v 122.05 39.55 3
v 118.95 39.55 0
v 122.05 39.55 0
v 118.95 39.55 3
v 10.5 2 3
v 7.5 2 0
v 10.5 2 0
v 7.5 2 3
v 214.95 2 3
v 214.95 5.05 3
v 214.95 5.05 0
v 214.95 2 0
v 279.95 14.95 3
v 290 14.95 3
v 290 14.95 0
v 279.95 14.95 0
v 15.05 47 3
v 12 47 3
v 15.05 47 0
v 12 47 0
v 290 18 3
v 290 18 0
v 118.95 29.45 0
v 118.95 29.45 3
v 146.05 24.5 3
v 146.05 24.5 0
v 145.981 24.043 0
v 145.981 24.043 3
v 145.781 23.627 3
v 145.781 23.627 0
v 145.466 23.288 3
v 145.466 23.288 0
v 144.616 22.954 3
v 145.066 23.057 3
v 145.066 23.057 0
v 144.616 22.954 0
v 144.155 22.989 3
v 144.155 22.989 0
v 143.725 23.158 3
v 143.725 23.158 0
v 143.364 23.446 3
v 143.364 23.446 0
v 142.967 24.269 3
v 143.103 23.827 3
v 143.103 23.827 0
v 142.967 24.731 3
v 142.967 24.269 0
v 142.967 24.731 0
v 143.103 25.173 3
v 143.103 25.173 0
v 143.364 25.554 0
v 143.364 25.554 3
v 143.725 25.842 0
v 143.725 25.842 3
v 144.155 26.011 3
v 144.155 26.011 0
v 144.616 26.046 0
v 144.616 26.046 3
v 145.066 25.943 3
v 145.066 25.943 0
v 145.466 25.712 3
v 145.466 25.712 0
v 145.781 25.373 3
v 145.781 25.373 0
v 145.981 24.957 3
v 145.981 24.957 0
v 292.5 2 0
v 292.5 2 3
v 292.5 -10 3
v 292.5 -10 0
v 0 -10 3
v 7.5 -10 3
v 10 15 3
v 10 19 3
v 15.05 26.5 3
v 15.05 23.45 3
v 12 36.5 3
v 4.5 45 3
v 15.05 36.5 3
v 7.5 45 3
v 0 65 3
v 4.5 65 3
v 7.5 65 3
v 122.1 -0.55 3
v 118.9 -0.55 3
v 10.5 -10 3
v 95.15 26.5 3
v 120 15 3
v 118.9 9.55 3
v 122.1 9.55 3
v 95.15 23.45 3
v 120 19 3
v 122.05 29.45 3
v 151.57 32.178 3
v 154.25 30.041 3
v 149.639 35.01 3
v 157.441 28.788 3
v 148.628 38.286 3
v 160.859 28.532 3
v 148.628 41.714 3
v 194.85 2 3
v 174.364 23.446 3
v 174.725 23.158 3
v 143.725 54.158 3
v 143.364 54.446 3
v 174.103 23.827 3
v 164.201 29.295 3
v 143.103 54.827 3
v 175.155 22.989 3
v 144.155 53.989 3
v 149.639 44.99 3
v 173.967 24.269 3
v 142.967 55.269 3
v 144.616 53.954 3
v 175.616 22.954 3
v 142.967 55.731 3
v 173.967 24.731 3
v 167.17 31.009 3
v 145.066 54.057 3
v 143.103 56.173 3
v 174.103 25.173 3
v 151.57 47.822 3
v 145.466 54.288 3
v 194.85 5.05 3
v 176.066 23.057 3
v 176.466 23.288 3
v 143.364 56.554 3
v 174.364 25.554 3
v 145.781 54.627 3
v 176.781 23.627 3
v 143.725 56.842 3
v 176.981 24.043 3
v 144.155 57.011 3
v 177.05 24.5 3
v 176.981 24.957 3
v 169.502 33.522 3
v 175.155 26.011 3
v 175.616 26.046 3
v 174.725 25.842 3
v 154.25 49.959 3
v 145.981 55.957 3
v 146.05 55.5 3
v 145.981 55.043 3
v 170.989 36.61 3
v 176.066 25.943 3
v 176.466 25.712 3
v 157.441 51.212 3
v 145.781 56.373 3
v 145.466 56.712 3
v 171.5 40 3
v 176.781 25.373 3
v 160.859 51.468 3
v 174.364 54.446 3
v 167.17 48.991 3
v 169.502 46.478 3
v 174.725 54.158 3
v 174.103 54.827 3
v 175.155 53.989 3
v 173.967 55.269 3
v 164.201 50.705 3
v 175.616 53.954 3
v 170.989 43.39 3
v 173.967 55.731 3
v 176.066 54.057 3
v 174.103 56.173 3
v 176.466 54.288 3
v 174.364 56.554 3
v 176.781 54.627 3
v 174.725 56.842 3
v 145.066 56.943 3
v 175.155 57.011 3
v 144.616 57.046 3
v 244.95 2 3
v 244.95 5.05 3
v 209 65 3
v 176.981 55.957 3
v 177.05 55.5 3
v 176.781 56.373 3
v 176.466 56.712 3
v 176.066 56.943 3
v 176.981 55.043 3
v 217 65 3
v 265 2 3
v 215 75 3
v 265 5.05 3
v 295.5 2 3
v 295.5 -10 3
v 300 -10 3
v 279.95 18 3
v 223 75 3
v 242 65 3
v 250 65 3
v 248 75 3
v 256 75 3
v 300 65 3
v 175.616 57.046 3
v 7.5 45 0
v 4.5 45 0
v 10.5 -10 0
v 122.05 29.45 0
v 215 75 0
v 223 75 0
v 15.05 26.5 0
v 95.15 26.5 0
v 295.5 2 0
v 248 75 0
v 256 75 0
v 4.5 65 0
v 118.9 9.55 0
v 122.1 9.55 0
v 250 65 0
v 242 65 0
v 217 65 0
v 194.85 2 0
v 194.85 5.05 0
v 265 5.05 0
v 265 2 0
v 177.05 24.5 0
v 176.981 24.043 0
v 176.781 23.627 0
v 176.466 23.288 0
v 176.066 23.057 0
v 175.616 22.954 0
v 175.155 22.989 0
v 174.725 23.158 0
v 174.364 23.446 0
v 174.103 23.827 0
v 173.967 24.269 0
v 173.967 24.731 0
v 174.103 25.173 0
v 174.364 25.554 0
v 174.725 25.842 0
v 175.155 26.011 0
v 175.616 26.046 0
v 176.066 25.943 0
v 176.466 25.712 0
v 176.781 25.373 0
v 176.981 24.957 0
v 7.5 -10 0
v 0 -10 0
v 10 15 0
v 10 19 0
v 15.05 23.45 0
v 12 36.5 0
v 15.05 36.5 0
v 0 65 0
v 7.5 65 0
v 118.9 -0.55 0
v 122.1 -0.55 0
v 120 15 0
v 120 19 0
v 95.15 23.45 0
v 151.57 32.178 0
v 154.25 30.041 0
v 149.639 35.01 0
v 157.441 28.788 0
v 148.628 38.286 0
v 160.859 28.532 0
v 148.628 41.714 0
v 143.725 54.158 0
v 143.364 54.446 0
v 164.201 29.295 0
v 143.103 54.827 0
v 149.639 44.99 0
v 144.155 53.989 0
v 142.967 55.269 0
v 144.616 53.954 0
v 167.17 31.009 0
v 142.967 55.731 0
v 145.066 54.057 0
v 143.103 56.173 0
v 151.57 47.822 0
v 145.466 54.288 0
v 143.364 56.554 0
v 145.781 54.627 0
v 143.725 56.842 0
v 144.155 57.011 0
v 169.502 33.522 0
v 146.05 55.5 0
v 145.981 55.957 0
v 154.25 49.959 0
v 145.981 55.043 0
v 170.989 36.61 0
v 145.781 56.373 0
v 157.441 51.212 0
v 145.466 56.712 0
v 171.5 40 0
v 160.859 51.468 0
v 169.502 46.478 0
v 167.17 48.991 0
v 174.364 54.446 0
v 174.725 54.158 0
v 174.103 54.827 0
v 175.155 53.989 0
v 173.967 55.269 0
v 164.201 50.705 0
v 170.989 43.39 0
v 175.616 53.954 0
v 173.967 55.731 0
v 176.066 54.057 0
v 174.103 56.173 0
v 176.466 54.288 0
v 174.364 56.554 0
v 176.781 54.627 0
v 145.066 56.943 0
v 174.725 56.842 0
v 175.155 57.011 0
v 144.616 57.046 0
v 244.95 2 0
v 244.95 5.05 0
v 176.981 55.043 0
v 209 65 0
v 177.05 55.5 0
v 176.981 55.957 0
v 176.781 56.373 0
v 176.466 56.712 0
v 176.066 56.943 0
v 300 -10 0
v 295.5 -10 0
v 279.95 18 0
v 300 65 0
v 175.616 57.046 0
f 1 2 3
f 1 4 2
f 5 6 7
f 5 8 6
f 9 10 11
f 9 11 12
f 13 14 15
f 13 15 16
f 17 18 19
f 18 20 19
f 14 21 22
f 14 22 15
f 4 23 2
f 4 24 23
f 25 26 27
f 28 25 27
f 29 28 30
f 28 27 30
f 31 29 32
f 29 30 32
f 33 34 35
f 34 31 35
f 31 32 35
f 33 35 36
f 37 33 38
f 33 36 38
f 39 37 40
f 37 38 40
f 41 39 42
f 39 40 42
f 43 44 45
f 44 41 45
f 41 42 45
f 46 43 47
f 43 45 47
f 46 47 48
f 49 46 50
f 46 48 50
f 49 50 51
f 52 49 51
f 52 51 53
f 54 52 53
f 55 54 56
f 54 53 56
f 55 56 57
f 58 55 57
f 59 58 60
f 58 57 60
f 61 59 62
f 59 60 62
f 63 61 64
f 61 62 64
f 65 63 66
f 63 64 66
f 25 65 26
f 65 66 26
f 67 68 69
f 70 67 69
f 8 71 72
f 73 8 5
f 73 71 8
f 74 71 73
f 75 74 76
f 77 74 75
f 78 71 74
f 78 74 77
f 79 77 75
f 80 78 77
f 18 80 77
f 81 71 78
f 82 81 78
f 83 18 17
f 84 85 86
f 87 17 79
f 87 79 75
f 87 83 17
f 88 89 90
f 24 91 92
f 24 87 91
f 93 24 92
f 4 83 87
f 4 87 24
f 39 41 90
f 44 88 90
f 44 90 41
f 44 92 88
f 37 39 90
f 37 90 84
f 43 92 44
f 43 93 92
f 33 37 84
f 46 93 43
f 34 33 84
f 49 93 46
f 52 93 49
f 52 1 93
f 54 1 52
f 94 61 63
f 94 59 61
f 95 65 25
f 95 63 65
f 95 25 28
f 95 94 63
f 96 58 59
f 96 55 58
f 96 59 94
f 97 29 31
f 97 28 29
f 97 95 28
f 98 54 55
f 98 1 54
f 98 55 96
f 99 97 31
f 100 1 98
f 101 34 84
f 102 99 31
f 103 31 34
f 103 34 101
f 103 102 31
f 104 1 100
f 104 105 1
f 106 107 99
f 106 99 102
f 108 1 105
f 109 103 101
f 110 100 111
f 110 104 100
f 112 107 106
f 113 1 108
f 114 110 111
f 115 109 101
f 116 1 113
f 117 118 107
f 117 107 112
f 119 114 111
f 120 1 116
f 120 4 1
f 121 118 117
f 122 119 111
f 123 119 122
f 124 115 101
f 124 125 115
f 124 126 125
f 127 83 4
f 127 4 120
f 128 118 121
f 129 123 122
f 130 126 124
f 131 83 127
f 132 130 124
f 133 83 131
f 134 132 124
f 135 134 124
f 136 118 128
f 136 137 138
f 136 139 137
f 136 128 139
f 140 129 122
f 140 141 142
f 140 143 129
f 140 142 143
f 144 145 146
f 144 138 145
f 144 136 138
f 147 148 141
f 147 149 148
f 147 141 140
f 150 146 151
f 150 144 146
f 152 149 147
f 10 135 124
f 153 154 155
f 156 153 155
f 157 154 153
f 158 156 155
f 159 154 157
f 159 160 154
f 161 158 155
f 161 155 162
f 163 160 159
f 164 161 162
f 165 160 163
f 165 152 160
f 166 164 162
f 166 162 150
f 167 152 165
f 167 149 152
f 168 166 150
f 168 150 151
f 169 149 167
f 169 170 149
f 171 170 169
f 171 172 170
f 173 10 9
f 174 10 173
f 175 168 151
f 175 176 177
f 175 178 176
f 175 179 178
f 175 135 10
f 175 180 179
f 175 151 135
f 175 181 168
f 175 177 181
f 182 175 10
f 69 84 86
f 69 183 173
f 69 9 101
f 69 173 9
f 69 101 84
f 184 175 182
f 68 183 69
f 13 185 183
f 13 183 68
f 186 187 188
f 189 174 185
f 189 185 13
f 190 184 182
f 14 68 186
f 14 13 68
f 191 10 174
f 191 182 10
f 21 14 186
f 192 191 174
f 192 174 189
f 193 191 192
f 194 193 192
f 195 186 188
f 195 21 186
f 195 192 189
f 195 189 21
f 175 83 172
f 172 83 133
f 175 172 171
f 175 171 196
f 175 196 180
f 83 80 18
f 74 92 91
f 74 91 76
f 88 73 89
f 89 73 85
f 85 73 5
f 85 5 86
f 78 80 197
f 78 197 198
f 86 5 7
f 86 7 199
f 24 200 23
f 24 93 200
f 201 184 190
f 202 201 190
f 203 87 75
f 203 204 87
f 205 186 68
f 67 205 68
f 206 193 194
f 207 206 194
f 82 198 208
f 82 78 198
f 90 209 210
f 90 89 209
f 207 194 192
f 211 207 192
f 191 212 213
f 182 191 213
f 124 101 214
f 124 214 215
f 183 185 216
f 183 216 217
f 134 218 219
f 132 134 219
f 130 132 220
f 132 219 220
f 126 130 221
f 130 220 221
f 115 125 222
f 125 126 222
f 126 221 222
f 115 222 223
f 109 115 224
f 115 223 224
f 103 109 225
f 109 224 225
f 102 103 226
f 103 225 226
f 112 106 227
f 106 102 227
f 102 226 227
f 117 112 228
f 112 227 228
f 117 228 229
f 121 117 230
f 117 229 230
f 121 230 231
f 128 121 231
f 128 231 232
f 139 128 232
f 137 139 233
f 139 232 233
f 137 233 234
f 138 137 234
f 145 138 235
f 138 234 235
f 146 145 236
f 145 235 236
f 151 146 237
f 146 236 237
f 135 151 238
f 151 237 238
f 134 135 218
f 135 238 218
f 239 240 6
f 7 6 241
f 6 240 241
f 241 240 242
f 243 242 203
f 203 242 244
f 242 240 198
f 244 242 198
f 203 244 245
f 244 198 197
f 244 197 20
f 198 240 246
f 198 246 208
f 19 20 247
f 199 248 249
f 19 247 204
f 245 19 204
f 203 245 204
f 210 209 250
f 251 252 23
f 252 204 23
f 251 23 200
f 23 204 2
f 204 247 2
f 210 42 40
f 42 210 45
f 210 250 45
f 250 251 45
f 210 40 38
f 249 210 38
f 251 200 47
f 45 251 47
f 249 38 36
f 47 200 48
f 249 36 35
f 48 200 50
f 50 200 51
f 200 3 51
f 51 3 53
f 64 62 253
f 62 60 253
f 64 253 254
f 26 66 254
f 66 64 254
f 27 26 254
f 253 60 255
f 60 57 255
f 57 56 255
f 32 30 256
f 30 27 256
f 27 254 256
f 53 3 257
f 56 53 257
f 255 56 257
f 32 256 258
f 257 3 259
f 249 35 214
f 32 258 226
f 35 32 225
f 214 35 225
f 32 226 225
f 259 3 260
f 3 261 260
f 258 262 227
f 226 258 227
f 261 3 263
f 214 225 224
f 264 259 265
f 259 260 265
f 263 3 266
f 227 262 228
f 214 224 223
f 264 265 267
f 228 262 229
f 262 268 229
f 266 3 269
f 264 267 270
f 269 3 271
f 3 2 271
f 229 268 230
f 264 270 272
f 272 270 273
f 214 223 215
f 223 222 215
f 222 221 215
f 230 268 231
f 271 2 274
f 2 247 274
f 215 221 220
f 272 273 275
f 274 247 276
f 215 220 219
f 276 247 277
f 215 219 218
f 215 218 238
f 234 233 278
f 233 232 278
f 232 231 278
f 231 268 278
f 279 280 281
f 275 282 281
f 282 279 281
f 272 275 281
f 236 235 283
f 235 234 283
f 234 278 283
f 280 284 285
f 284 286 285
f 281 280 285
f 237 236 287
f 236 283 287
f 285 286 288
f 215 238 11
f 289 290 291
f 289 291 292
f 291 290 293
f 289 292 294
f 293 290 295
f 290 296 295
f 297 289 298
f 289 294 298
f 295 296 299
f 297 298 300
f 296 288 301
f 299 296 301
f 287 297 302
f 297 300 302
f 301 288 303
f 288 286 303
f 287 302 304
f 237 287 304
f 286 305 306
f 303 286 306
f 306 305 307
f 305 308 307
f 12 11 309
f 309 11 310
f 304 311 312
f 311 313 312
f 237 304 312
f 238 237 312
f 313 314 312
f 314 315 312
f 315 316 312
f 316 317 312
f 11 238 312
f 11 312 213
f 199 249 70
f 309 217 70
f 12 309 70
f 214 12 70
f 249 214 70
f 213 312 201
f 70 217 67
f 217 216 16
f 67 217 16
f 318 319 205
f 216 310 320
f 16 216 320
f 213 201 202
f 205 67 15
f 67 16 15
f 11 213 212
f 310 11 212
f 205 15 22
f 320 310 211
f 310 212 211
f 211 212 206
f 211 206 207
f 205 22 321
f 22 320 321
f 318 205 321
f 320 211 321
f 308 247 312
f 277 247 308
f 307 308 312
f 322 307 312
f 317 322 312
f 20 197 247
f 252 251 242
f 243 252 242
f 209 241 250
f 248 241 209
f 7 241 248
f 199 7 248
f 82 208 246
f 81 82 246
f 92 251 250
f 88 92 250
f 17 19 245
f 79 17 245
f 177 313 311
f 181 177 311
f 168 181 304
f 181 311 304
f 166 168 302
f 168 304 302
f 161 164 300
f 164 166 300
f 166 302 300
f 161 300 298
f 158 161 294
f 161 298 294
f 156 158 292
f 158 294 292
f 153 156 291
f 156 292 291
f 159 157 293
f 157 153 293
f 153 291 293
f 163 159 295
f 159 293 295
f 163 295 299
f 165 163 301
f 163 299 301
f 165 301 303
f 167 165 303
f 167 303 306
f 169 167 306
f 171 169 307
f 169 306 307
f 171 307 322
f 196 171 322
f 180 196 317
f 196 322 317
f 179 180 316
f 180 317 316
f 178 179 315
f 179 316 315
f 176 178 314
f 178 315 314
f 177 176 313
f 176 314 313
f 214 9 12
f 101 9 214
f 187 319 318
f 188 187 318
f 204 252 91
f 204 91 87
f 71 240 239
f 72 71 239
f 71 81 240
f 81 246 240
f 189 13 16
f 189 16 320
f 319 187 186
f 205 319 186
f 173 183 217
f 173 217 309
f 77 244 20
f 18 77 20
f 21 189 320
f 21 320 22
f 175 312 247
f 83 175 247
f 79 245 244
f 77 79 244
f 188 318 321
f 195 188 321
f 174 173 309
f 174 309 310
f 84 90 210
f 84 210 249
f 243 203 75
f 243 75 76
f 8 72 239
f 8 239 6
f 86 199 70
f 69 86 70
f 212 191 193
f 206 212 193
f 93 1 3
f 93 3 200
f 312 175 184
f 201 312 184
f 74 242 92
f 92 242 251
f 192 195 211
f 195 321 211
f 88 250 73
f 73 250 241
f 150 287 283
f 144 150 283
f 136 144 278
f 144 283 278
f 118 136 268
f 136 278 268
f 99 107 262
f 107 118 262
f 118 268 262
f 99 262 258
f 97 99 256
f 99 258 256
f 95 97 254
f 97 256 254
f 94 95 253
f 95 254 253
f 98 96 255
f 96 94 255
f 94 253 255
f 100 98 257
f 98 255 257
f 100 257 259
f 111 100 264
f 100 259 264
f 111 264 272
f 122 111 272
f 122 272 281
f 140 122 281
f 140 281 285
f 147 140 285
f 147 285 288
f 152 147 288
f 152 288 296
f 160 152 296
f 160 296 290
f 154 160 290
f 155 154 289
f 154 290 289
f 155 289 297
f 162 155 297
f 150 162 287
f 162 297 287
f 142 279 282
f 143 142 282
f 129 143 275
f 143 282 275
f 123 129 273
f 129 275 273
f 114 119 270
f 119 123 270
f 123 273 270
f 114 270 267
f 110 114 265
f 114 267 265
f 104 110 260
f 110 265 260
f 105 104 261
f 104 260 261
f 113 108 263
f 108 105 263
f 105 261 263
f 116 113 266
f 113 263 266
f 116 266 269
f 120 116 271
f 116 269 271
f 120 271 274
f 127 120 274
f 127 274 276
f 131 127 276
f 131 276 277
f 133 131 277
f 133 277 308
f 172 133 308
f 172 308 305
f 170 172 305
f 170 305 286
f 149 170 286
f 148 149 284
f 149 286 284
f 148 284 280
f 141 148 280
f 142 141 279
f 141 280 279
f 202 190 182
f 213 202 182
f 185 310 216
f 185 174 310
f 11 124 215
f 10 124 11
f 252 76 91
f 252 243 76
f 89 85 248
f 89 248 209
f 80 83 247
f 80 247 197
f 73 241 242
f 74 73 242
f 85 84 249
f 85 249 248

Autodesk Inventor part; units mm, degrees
ref_plane "YZ Plane" through (0, 0, 0) normal (1, 0, 0) x (0, 1, 0)
ref_plane "XZ Plane" through (0, 0, 0) normal (0, 1, 0) x (-1, 0, 0)
ref_plane "XY Plane" through (0, 0, 0) normal (0, 0, 1) x (1, 0, 0)
sketch "Sketch1" plane through (0, 0, 0) normal (0, 0, 1) x (1, 0, 0)
  line L0 (0, 0) -> (300, 0)
  line L1 (300, 0) -> (300, 65)
  line L2 (300, 65) -> (0, 65)
  line L3 (0, 65) -> (0, 0)
  circle A0 centre (144.5, 55.5) radius 1.55
  circle A1 centre (144.5, 24.5) radius 1.55
  circle A2 centre (175.5, 55.5) radius 1.55
  circle A3 centre (175.5, 24.5) radius 1.55
  circle A4 centre (160, 40) radius 11.5
  line L4 (10, 19) -> (120, 19)
  line L5 (120, 19) -> (120, 15)
  line L6 (120, 15) -> (10, 15)
  line L7 (10, 15) -> (10, 19)
  line L8 (0, 65) -> (39.6145, 65)
  line L9 (4.5, 65) -> (7.5, 65)
  line L10 (0, 65) -> (50, 65)
  line L11 (0, 0) -> (0, -10)
  line L12 (0, -10) -> (300, -10)
  line L13 (300, -10) -> (300, 0)
  point P0 (10, 17)
  point P1 (120, 17)
  dimension "d1" = 3.1
  dimension "d2" = 3.1
  dimension "d3" = 3.1
  dimension "d4" = 3.1
  dimension "d5" = 31
  dimension "d7" = 23
  dimension "d8" = 15.5
  dimension "d9" = 15.5
  dimension "d10" = 65
  dimension "d11" = 31
  dimension "d13" = 40
  dimension "d54" = 300
  dimension "d55" = 3
  dimension "d59" = 110
  dimension "d93" = 15
  dimension "d107" = 10
  dimension "d201" = 4
  dimension "d202" = 10
  dimension "d287" = 140
extrude "Extrusion1" add sketch "Sketch1" along normal blind 3
sketch "Sketch7" plane through (0, 0, 3) normal (0, 0, 1) x (1, 0, 0)
  line L0 (300, 65) -> (0, 65) projected
  circle A0 centre (144.5, 55.5) radius 1.55 projected
  line L1 (118.95, 39.55) -> (122.05, 39.55)
  line L2 (122.05, 39.55) -> (122.05, 29.45)
  line L3 (122.05, 29.45) -> (118.95, 29.45)
  line L4 (118.95, 29.45) -> (118.95, 39.55)
  line L5 (118.95, 39.55) -> (122.05, 29.45) construction
  line L6 (122.05, 39.55) -> (118.95, 29.45) construction
  line L7 (122.1, 9.55) -> (122.1, -0.55)
  line L8 (122.1, -0.55) -> (118.9, -0.55)
  line L9 (118.9, 9.55) -> (122.1, 9.55)
  line L10 (118.9, -0.55) -> (118.9, 9.55)
  line L11 (118.9, 9.55) -> (122.1, -0.55) construction
  line L12 (122.1, 9.55) -> (118.9, -0.55) construction
  line L13 (0, -10) -> (300, -10) projected
  line L14 (300, -10) -> (300, 65) projected
  circle A1 centre (144.5, 24.5) radius 1.55 projected
  point P0 (0, 0)
  point P1 (242, 62)
  point P2 (120.5, 34.5)
  point P3 (120.5, 4.5)
  point P4 (118.9, 4.5)
  point P5 (150, -10)
  dimension "d185" = 3.2
  dimension "d271" = 3.1
  dimension "d273" = 30
  dimension "d275" = 24
extrude "Extrusion6" cut sketch "Sketch7" against normal blind 3 contours L1 L2 L3 L4 | L7 L8 L10 L9
sketch "Sketch8" plane through (0, 0, 3) normal (0, 0, 1) x (1, 0, 0)
  line L0 (0, -10) -> (300, -10) projected
  line L1 (279.95, 18) -> (290, 18)
  line L2 (290, 18) -> (290, 14.95)
  line L3 (290, 14.95) -> (279.95, 14.95)
  line L4 (279.95, 14.95) -> (279.95, 18)
  line L5 (300, -10) -> (300, 65) projected
  line L6 (7.5, 2) -> (10.5, 2)
  line L7 (10.5, 2) -> (10.5, -10)
  line L8 (10.5, -10) -> (7.5, -10)
  line L9 (7.5, -10) -> (7.5, 2)
  line L10 (7.5, 2) -> (10.5, -10) construction
  line L11 (10.5, 2) -> (7.5, -10) construction
  line L12 (295.5, 2) -> (292.5, 2)
  line L13 (292.5, 2) -> (292.5, -10)
  line L14 (292.5, -10) -> (295.5, -10)
  line L15 (295.5, -10) -> (295.5, 2)
  line L16 (295.5, 2) -> (292.5, -10) construction
  line L17 (292.5, 2) -> (295.5, -10) construction
  line L18 (300, 65) -> (0, 65) projected
  line L19 (7.5, 45) -> (4.5, 45)
  line L20 (4.5, 45) -> (4.5, 65)
  line L21 (4.5, 65) -> (7.5, 65)
  line L22 (7.5, 65) -> (7.5, 45)
  line L23 (7.5, 45) -> (4.5, 65) construction
  line L24 (4.5, 45) -> (7.5, 65) construction
  point P0 (0, 0)
  point P1 (9, -4)
  point P2 (7.5, -4)
  point P3 (294, -4)
  point P4 (7.5, -10)
  point P5 (10.5, -10)
  point P6 (6, 55)
  dimension "d219" = 28
  dimension "d220" = 3.05
  dimension "d221" = 10.05
  dimension "d222" = 10
  dimension "d223" = 3
  dimension "d247" = 3
  dimension "d248" = 6
  dimension "d249" = 12
  dimension "d296" = 3
  dimension "d297" = 4.5
  dimension "d298" = 20
extrude "Extrusion7" cut sketch "Sketch8" against normal blind 3
sketch "Sketch11" plane through (0, 0, 0) normal (0, 0, -1) x (-1, 0, 0)
  line L0 (-12, 47) -> (-15.05, 47)
  line L1 (-15.05, 47) -> (-15.05, 36.5)
  line L2 (-15.05, 36.5) -> (-12, 36.5)
  line L3 (-12, 36.5) -> (-12, 47)
  line L4 (0, 65) -> (0, -10) projected
  line L5 (-300, 65) -> (0, 65) projected
  line L6 (-95.15, 26.5) -> (-15.05, 26.5)
  line L7 (-15.05, 26.5) -> (-15.05, 23.45)
  line L8 (-15.05, 23.45) -> (-95.15, 23.45)
  line L9 (-95.15, 23.45) -> (-95.15, 26.5)
  point P0 (0, 0)
  point P1 (-12, 41.75)
  point P2 (-7.5, 65)
  dimension "d276" = 12
  dimension "d277" = 18
  dimension "d278" = 10.5
  dimension "d279" = 3.05
  dimension "d282" = 10
  dimension "d283" = 80.1
  dimension "d284" = 3.05
extrude "Extrusion9" cut sketch "Sketch11" against normal blind 3
sketch "Sketch12" plane through (0, 0, 3) normal (0, 0, 1) x (1, 0, 0)
  line L0 (194.85, 5.05) -> (214.95, 5.05)
  line L1 (214.95, 5.05) -> (214.95, 2)
  line L2 (214.95, 2) -> (194.85, 2)
  line L3 (194.85, 2) -> (194.85, 5.05)
  line L4 (244.95, 5.05) -> (265, 5.05)
  line L5 (265, 5.05) -> (265, 2)
  line L6 (265, 2) -> (244.95, 2)
  line L7 (244.95, 2) -> (244.95, 5.05)
  point P0 (0, 0)
  point P1 (300, -10)
  dimension "d288" = 3.05
  dimension "d289" = 20.05
  dimension "d290" = 20.1
  dimension "d291" = 30
  dimension "d292" = 35
  dimension "d293" = 12
extrude "Extrusion10" cut sketch "Sketch12" against normal blind 3
sketch "Sketch13" plane through (0, 0, 3) normal (0, 0, 1) x (1, 0, 0)
  line L0 (300, 65) -> (7.5, 65) projected
  line L1 (209, 65) -> (215, 75)
  line L2 (215, 75) -> (223, 75)
  line L3 (223, 75) -> (217, 65)
  line L4 (242, 65) -> (248, 75)
  line L5 (248, 75) -> (256, 75)
  line L6 (256, 75) -> (250, 65)
  point P0 (0, 0)
  dimension "d299" = 10
  dimension "d300" = 8
  dimension "d301" = 6
  dimension "d302" = 50
  dimension "d303" = 25
  dimension "d304" = 8
extrude "Extrusion11" add sketch "Sketch13" against normal blind 3
properties part number "Sideboard"
